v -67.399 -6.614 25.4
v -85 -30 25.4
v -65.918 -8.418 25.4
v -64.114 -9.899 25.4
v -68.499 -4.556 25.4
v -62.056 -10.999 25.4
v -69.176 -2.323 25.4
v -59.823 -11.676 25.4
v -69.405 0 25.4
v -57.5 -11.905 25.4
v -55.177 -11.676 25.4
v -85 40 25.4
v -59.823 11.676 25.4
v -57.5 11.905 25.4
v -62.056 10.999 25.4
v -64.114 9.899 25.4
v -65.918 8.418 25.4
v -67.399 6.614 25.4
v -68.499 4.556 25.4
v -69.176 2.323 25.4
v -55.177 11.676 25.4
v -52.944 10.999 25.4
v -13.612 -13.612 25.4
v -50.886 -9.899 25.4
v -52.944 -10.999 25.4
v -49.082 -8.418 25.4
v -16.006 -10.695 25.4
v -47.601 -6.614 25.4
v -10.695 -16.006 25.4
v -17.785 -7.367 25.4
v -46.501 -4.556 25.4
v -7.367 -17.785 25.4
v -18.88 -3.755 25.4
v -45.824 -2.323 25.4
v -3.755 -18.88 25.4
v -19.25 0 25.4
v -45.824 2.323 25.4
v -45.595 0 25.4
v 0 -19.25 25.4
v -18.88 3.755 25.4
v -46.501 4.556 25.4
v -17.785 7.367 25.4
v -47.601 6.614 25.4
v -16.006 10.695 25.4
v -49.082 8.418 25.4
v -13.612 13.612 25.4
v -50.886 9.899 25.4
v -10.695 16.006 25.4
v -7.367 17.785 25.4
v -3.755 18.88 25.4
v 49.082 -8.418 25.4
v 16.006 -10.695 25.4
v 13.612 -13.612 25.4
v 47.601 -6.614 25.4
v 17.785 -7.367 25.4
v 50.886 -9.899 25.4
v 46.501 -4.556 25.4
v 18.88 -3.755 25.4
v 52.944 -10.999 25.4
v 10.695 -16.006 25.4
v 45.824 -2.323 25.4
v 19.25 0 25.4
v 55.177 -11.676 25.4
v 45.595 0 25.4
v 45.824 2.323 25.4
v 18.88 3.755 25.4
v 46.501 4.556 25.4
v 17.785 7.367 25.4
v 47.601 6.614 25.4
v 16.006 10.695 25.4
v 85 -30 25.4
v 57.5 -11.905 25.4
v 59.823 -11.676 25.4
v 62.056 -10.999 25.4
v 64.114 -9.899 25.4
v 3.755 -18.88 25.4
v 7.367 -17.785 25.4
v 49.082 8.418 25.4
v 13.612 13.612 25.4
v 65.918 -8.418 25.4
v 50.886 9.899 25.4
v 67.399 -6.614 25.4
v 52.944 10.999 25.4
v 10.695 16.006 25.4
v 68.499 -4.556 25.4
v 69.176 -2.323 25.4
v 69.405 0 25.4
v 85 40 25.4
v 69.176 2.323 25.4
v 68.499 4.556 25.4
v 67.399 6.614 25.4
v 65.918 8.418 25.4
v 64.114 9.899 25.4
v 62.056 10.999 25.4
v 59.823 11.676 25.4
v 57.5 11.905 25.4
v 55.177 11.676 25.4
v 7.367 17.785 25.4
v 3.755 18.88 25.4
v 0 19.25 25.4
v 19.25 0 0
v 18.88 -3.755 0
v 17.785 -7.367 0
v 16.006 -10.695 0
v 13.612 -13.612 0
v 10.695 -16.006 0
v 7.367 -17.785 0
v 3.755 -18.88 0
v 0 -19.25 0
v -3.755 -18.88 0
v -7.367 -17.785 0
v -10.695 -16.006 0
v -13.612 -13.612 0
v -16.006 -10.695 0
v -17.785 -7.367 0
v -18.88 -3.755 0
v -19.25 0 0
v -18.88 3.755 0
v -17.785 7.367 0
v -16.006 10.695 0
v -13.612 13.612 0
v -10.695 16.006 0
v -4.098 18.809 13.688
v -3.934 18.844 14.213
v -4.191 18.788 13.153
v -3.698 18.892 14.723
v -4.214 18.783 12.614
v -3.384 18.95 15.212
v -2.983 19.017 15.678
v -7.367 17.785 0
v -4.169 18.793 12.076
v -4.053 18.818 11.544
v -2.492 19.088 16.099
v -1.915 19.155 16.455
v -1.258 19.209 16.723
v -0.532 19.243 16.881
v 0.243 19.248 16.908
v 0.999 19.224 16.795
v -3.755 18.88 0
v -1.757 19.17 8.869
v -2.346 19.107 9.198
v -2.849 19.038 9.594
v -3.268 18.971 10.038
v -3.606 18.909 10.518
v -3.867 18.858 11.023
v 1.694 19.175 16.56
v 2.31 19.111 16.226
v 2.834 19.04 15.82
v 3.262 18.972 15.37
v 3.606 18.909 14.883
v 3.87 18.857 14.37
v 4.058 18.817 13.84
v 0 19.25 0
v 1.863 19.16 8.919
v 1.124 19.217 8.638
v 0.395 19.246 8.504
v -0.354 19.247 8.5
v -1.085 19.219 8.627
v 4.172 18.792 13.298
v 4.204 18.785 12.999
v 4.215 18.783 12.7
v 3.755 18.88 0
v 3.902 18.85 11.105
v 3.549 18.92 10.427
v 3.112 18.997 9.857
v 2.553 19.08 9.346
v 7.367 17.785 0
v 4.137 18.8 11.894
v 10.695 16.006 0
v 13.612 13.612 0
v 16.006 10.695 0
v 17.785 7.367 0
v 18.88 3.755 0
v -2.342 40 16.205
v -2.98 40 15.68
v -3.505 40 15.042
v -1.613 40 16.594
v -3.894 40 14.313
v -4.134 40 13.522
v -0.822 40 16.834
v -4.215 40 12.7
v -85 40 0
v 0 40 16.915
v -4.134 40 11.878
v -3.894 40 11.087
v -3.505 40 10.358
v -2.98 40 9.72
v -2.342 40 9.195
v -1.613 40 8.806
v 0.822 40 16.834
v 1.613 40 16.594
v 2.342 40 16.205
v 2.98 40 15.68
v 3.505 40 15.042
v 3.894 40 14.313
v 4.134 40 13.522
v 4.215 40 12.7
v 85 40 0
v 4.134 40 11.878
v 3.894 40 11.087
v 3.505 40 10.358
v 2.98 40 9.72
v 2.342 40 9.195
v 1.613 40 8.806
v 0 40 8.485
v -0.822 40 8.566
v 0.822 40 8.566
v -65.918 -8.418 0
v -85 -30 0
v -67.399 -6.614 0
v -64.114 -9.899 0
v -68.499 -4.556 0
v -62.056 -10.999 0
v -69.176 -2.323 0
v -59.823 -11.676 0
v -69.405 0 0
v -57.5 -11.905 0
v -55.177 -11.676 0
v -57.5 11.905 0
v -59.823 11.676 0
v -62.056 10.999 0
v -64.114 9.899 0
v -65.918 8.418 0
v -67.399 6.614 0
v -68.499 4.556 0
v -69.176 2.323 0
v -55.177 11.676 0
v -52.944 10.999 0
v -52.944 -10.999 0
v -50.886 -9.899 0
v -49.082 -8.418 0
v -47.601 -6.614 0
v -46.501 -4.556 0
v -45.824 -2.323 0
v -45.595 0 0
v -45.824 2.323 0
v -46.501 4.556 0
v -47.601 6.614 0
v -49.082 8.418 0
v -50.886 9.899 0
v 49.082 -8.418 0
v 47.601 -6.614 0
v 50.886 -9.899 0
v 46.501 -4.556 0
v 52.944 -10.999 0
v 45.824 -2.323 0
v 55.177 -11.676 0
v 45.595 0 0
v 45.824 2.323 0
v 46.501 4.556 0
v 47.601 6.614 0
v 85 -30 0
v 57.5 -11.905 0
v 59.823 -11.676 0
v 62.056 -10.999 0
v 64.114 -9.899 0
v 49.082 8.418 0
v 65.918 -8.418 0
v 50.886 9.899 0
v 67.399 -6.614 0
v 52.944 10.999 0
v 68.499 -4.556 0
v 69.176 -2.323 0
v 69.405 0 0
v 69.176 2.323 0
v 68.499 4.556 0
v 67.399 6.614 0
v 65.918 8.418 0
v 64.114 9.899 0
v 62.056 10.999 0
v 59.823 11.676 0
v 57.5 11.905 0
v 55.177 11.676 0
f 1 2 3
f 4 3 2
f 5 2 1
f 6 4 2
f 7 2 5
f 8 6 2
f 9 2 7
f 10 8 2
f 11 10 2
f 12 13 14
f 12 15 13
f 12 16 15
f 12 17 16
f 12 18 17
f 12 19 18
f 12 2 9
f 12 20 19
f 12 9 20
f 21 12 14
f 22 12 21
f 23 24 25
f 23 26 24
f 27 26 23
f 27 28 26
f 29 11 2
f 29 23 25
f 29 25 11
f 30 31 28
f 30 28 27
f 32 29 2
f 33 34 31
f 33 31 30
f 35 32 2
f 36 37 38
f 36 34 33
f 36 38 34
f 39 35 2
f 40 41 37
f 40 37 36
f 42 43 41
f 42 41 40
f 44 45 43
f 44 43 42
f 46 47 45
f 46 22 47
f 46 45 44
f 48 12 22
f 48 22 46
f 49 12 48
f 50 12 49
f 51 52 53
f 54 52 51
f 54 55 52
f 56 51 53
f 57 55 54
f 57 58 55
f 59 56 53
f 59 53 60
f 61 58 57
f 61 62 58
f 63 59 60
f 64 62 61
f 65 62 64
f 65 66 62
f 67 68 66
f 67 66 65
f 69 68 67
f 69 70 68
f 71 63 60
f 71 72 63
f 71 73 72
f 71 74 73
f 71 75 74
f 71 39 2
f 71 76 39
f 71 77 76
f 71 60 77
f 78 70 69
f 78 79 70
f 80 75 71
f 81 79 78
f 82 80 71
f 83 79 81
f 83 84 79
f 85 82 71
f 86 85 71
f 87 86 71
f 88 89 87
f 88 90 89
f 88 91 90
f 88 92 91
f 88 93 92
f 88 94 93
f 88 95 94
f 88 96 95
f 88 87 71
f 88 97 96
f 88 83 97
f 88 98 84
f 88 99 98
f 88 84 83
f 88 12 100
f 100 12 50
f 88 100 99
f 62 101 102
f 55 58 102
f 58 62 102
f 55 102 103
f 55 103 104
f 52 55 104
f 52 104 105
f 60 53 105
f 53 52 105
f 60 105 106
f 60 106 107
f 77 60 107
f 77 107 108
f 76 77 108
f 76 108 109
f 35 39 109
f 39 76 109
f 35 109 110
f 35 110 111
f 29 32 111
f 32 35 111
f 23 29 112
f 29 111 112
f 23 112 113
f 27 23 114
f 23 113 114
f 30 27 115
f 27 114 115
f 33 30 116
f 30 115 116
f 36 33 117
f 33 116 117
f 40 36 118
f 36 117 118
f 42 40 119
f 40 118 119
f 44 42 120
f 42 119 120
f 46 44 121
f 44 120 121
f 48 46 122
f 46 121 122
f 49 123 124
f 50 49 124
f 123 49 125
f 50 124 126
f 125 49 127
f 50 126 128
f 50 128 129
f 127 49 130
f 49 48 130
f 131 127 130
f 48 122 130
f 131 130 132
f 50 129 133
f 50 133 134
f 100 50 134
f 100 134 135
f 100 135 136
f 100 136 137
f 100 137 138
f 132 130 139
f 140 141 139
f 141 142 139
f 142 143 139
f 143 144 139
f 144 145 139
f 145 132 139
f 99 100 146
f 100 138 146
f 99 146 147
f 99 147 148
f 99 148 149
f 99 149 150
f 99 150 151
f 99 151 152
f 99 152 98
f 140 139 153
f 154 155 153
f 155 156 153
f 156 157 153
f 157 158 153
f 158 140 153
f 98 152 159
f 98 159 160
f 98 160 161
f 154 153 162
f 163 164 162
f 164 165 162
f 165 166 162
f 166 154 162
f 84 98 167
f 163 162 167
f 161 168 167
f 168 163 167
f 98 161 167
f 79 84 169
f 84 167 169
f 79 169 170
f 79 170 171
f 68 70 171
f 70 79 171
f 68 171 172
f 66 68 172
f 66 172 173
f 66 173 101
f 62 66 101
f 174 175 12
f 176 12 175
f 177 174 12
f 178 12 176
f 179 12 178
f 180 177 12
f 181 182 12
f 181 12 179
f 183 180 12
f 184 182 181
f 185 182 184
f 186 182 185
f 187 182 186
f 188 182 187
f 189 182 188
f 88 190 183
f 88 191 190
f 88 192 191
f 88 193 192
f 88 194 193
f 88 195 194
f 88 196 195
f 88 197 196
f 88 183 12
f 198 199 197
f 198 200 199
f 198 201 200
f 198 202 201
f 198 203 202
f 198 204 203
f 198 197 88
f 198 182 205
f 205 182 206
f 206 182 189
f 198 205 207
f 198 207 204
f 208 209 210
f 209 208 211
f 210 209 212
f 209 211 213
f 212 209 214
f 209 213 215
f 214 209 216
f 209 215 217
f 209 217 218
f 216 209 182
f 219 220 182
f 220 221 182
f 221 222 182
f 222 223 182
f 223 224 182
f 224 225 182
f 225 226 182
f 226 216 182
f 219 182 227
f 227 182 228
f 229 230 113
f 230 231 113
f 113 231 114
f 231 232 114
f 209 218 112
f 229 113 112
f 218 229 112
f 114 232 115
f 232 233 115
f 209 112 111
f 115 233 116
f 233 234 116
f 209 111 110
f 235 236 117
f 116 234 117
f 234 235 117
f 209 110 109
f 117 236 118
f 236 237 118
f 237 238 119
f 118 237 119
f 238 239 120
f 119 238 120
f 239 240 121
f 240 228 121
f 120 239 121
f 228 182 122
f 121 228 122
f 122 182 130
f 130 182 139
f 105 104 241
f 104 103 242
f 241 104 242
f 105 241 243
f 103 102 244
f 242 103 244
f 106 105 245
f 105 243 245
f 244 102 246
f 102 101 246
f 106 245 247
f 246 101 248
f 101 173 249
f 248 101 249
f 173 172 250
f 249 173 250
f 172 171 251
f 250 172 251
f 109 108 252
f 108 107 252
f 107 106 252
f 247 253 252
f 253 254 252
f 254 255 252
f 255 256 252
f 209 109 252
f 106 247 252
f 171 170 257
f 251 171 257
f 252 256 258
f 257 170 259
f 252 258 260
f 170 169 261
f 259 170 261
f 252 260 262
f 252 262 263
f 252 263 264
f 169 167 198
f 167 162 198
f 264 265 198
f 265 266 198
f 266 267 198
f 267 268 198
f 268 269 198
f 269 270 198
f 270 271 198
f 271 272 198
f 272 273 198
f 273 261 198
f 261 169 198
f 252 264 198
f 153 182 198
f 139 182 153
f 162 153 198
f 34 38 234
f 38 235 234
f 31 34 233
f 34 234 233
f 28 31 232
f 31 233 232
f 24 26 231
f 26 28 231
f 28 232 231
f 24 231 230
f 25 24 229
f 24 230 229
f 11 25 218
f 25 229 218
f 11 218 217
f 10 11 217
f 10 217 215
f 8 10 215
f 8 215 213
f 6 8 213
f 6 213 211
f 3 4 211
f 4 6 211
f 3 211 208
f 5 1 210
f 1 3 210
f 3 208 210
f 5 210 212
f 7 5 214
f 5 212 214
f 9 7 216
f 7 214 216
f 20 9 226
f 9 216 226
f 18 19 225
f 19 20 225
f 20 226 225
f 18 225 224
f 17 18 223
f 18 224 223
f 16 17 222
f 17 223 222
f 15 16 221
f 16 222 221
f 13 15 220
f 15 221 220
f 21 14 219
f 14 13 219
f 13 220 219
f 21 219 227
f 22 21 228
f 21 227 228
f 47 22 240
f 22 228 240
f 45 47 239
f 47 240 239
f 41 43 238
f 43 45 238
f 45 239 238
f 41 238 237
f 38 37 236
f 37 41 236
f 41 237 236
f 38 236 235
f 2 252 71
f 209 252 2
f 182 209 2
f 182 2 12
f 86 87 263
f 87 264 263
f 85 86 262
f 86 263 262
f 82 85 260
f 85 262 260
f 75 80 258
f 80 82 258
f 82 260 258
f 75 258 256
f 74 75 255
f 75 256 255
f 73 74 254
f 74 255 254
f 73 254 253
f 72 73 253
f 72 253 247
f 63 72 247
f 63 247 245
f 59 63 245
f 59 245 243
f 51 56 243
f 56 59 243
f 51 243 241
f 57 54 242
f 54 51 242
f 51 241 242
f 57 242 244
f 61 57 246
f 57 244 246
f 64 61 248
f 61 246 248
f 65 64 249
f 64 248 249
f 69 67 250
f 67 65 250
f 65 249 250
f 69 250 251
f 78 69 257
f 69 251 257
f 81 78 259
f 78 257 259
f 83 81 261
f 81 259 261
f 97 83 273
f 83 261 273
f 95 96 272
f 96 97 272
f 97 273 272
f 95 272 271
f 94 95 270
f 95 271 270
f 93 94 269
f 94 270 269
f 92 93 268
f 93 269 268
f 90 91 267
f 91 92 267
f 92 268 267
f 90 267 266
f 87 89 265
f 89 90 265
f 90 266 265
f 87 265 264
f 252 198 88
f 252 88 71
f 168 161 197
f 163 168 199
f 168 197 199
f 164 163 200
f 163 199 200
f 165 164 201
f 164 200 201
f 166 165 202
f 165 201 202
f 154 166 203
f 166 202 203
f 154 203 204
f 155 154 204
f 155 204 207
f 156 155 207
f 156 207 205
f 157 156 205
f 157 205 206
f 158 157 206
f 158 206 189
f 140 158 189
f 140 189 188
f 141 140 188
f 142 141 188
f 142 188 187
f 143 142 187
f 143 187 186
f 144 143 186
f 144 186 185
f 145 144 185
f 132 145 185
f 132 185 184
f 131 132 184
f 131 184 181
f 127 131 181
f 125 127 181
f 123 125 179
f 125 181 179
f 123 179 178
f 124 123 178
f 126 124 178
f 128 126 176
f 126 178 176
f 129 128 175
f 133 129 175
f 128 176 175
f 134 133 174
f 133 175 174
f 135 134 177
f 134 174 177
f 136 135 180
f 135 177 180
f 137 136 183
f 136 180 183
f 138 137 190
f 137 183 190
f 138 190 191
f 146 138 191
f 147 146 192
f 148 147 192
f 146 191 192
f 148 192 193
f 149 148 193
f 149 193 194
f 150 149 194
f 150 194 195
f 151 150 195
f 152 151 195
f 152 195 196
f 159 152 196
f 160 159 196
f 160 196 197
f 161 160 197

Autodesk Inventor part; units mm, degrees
ref_plane "YZ Plane" through (0, 0, 0) normal (1, 0, 0) x (0, 1, 0)
ref_plane "XZ Plane" through (0, 0, 0) normal (0, 1, 0) x (-1, 0, 0)
ref_plane "XY Plane" through (0, 0, 0) normal (0, 0, 1) x (1, 0, 0)
sketch "Sketch1" plane through (0, 0, 0) normal (0, 0, 1) x (1, 0, 0)
  circle A0 centre (0, 0) radius 19.25
  line L0 (-85, 40) -> (85, 40)
  line L1 (85, 40) -> (85, -30)
  line L2 (85, -30) -> (-85, -30)
  line L3 (-85, -30) -> (-85, 40)
  circle A1 centre (57.5, 0) radius 11.905
  circle A2 centre (-57.5, 0) radius 11.905
  dimension "d0" = 38.5
  dimension "d1" = 23.81
  dimension "d2" = 23.81
  dimension "d3" = 57.5
  dimension "d4" = 57.5
  dimension "d5" = 170
  dimension "d6" = 85
  dimension "d7" = 70
  dimension "d8" = 40
extrude "Extrusion1" add sketch "Sketch1" along normal blind 25.4
sketch "Sketch2" plane through (-85, 40, 0) normal (0, 1, 0) x (1, 0, 0)
  circle A0 centre (85, -12.7) radius 4.215
  line L0 (170, 0) -> (170, -25.4) projected
  point P0 (85, 0)
  dimension "d11" = 8.43
  dimension "d12" = 12.7
  dimension "d13" = 85
extrude "Extrusion2" cut sketch "Sketch2" against normal blind 25.4
properties part number "1234_Spool Plate_V1" material "Aluminum"
